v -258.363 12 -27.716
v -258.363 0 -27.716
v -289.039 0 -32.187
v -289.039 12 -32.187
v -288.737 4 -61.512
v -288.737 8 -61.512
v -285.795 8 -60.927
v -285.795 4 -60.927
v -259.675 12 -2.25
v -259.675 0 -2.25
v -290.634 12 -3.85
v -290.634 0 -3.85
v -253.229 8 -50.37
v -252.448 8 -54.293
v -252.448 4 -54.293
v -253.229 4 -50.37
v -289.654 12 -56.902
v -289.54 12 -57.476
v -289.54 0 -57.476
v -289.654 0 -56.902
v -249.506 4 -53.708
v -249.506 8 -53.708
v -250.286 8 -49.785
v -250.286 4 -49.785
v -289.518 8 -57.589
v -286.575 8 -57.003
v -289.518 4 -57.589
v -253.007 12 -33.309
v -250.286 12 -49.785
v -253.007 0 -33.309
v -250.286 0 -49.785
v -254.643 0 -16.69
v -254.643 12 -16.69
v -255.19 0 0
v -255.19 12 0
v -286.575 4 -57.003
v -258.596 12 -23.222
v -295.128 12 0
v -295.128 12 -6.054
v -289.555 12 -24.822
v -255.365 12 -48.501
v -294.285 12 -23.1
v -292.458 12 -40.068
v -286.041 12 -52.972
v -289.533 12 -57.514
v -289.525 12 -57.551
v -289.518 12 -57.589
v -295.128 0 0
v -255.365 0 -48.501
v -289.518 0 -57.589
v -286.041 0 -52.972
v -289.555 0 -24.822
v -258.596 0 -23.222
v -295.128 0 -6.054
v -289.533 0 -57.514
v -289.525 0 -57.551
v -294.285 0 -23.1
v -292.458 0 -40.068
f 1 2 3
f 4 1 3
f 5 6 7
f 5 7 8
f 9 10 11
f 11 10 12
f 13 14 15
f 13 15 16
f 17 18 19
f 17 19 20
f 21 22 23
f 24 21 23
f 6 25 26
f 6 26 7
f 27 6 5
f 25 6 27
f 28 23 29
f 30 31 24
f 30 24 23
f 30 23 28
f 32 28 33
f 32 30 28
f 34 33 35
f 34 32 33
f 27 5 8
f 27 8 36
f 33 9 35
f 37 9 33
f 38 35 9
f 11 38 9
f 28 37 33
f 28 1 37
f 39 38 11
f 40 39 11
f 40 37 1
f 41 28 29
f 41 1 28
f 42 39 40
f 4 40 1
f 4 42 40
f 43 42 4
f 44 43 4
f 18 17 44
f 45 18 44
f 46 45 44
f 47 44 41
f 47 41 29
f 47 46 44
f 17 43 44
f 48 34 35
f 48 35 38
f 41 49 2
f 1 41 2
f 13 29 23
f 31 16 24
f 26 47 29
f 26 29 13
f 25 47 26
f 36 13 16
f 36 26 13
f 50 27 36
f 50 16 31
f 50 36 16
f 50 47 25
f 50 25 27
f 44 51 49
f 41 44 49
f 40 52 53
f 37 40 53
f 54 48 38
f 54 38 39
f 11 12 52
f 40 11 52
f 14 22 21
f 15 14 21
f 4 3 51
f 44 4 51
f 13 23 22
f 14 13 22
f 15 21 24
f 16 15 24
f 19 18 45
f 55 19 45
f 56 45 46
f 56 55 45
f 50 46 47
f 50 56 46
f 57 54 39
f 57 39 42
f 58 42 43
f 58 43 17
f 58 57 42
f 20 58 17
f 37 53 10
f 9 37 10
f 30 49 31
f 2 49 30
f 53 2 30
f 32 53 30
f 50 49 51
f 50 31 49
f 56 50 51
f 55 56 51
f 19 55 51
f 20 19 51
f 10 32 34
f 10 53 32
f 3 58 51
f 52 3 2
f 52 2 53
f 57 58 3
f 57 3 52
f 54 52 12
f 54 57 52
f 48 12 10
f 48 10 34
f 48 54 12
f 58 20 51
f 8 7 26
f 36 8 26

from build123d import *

# Parameters (mm, degrees)
BOSS_EXTRUDE1_DEPTH = 12
BOSS_EXTRUDE2_DEPTH = 3


with BuildPart() as part:
    # Sketch1 → Boss-Extrude1 (new body)
    with BuildSketch(Plane(origin=(0, 0, 0), x_dir=(1, 0, 0), z_dir=(0, 1, 0))):
        with BuildLine():
            Line((-289.517864278, 57.588683782), (-250.286431131, 49.785066539))
            ThreePointArc((-250.286431131, 49.785066539), (-253.961023409, 25.012977594), (-255.189832201, 0))
            Line((-255.189832201, 0), (-295.127762341, 0))
            Line((-295.127762341, 0), (-295.127762341, 6.054265565))
            ThreePointArc((-295.127762341, 6.054265565), (-293.456259512, 31.944858577), (-289.517864278, 57.588683782))
        make_face()
        Polygon((-255.364905165, 48.501157726), (-258.362561508, 27.716209892), (-289.038525769, 32.186692712), (-286.040869426, 52.971640546), align=None, mode=Mode.SUBTRACT)
        Polygon((-258.596218965, 23.222280187), (-259.674858729, 2.25), (-290.633540871, 3.85), (-289.554901108, 24.822280187), align=None, mode=Mode.SUBTRACT)
    extrude(amount=BOSS_EXTRUDE1_DEPTH)

    # Sketch4 → Boss-Extrude2 (add)
    with BuildSketch(Plane(origin=(-250.286431131, 0, -49.785066539), x_dir=(0.19509032201612864, 0, -0.9807852804032304), z_dir=(0.9807852804032303, 0, 0.1950903220161286))):
        Polygon((-0.699680901, 12), (0, 12), (0, 8), (4, 8), (4, 4), (0, 4), (0, 0), (-0.699680901, 0), align=None)
    boss_extrude2 = extrude(amount=-BOSS_EXTRUDE2_DEPTH)

    # Mirror3: Boss-Extrude2 across plane
    add(boss_extrude2.mirror(Plane(origin=(-269.902136739, 0, -53.68687298), x_dir=(-0.19509032201612864, 0, 0.9807852804032303), z_dir=(0.9807852804032304, 0, 0.19509032201612864))))


solid = part.part
